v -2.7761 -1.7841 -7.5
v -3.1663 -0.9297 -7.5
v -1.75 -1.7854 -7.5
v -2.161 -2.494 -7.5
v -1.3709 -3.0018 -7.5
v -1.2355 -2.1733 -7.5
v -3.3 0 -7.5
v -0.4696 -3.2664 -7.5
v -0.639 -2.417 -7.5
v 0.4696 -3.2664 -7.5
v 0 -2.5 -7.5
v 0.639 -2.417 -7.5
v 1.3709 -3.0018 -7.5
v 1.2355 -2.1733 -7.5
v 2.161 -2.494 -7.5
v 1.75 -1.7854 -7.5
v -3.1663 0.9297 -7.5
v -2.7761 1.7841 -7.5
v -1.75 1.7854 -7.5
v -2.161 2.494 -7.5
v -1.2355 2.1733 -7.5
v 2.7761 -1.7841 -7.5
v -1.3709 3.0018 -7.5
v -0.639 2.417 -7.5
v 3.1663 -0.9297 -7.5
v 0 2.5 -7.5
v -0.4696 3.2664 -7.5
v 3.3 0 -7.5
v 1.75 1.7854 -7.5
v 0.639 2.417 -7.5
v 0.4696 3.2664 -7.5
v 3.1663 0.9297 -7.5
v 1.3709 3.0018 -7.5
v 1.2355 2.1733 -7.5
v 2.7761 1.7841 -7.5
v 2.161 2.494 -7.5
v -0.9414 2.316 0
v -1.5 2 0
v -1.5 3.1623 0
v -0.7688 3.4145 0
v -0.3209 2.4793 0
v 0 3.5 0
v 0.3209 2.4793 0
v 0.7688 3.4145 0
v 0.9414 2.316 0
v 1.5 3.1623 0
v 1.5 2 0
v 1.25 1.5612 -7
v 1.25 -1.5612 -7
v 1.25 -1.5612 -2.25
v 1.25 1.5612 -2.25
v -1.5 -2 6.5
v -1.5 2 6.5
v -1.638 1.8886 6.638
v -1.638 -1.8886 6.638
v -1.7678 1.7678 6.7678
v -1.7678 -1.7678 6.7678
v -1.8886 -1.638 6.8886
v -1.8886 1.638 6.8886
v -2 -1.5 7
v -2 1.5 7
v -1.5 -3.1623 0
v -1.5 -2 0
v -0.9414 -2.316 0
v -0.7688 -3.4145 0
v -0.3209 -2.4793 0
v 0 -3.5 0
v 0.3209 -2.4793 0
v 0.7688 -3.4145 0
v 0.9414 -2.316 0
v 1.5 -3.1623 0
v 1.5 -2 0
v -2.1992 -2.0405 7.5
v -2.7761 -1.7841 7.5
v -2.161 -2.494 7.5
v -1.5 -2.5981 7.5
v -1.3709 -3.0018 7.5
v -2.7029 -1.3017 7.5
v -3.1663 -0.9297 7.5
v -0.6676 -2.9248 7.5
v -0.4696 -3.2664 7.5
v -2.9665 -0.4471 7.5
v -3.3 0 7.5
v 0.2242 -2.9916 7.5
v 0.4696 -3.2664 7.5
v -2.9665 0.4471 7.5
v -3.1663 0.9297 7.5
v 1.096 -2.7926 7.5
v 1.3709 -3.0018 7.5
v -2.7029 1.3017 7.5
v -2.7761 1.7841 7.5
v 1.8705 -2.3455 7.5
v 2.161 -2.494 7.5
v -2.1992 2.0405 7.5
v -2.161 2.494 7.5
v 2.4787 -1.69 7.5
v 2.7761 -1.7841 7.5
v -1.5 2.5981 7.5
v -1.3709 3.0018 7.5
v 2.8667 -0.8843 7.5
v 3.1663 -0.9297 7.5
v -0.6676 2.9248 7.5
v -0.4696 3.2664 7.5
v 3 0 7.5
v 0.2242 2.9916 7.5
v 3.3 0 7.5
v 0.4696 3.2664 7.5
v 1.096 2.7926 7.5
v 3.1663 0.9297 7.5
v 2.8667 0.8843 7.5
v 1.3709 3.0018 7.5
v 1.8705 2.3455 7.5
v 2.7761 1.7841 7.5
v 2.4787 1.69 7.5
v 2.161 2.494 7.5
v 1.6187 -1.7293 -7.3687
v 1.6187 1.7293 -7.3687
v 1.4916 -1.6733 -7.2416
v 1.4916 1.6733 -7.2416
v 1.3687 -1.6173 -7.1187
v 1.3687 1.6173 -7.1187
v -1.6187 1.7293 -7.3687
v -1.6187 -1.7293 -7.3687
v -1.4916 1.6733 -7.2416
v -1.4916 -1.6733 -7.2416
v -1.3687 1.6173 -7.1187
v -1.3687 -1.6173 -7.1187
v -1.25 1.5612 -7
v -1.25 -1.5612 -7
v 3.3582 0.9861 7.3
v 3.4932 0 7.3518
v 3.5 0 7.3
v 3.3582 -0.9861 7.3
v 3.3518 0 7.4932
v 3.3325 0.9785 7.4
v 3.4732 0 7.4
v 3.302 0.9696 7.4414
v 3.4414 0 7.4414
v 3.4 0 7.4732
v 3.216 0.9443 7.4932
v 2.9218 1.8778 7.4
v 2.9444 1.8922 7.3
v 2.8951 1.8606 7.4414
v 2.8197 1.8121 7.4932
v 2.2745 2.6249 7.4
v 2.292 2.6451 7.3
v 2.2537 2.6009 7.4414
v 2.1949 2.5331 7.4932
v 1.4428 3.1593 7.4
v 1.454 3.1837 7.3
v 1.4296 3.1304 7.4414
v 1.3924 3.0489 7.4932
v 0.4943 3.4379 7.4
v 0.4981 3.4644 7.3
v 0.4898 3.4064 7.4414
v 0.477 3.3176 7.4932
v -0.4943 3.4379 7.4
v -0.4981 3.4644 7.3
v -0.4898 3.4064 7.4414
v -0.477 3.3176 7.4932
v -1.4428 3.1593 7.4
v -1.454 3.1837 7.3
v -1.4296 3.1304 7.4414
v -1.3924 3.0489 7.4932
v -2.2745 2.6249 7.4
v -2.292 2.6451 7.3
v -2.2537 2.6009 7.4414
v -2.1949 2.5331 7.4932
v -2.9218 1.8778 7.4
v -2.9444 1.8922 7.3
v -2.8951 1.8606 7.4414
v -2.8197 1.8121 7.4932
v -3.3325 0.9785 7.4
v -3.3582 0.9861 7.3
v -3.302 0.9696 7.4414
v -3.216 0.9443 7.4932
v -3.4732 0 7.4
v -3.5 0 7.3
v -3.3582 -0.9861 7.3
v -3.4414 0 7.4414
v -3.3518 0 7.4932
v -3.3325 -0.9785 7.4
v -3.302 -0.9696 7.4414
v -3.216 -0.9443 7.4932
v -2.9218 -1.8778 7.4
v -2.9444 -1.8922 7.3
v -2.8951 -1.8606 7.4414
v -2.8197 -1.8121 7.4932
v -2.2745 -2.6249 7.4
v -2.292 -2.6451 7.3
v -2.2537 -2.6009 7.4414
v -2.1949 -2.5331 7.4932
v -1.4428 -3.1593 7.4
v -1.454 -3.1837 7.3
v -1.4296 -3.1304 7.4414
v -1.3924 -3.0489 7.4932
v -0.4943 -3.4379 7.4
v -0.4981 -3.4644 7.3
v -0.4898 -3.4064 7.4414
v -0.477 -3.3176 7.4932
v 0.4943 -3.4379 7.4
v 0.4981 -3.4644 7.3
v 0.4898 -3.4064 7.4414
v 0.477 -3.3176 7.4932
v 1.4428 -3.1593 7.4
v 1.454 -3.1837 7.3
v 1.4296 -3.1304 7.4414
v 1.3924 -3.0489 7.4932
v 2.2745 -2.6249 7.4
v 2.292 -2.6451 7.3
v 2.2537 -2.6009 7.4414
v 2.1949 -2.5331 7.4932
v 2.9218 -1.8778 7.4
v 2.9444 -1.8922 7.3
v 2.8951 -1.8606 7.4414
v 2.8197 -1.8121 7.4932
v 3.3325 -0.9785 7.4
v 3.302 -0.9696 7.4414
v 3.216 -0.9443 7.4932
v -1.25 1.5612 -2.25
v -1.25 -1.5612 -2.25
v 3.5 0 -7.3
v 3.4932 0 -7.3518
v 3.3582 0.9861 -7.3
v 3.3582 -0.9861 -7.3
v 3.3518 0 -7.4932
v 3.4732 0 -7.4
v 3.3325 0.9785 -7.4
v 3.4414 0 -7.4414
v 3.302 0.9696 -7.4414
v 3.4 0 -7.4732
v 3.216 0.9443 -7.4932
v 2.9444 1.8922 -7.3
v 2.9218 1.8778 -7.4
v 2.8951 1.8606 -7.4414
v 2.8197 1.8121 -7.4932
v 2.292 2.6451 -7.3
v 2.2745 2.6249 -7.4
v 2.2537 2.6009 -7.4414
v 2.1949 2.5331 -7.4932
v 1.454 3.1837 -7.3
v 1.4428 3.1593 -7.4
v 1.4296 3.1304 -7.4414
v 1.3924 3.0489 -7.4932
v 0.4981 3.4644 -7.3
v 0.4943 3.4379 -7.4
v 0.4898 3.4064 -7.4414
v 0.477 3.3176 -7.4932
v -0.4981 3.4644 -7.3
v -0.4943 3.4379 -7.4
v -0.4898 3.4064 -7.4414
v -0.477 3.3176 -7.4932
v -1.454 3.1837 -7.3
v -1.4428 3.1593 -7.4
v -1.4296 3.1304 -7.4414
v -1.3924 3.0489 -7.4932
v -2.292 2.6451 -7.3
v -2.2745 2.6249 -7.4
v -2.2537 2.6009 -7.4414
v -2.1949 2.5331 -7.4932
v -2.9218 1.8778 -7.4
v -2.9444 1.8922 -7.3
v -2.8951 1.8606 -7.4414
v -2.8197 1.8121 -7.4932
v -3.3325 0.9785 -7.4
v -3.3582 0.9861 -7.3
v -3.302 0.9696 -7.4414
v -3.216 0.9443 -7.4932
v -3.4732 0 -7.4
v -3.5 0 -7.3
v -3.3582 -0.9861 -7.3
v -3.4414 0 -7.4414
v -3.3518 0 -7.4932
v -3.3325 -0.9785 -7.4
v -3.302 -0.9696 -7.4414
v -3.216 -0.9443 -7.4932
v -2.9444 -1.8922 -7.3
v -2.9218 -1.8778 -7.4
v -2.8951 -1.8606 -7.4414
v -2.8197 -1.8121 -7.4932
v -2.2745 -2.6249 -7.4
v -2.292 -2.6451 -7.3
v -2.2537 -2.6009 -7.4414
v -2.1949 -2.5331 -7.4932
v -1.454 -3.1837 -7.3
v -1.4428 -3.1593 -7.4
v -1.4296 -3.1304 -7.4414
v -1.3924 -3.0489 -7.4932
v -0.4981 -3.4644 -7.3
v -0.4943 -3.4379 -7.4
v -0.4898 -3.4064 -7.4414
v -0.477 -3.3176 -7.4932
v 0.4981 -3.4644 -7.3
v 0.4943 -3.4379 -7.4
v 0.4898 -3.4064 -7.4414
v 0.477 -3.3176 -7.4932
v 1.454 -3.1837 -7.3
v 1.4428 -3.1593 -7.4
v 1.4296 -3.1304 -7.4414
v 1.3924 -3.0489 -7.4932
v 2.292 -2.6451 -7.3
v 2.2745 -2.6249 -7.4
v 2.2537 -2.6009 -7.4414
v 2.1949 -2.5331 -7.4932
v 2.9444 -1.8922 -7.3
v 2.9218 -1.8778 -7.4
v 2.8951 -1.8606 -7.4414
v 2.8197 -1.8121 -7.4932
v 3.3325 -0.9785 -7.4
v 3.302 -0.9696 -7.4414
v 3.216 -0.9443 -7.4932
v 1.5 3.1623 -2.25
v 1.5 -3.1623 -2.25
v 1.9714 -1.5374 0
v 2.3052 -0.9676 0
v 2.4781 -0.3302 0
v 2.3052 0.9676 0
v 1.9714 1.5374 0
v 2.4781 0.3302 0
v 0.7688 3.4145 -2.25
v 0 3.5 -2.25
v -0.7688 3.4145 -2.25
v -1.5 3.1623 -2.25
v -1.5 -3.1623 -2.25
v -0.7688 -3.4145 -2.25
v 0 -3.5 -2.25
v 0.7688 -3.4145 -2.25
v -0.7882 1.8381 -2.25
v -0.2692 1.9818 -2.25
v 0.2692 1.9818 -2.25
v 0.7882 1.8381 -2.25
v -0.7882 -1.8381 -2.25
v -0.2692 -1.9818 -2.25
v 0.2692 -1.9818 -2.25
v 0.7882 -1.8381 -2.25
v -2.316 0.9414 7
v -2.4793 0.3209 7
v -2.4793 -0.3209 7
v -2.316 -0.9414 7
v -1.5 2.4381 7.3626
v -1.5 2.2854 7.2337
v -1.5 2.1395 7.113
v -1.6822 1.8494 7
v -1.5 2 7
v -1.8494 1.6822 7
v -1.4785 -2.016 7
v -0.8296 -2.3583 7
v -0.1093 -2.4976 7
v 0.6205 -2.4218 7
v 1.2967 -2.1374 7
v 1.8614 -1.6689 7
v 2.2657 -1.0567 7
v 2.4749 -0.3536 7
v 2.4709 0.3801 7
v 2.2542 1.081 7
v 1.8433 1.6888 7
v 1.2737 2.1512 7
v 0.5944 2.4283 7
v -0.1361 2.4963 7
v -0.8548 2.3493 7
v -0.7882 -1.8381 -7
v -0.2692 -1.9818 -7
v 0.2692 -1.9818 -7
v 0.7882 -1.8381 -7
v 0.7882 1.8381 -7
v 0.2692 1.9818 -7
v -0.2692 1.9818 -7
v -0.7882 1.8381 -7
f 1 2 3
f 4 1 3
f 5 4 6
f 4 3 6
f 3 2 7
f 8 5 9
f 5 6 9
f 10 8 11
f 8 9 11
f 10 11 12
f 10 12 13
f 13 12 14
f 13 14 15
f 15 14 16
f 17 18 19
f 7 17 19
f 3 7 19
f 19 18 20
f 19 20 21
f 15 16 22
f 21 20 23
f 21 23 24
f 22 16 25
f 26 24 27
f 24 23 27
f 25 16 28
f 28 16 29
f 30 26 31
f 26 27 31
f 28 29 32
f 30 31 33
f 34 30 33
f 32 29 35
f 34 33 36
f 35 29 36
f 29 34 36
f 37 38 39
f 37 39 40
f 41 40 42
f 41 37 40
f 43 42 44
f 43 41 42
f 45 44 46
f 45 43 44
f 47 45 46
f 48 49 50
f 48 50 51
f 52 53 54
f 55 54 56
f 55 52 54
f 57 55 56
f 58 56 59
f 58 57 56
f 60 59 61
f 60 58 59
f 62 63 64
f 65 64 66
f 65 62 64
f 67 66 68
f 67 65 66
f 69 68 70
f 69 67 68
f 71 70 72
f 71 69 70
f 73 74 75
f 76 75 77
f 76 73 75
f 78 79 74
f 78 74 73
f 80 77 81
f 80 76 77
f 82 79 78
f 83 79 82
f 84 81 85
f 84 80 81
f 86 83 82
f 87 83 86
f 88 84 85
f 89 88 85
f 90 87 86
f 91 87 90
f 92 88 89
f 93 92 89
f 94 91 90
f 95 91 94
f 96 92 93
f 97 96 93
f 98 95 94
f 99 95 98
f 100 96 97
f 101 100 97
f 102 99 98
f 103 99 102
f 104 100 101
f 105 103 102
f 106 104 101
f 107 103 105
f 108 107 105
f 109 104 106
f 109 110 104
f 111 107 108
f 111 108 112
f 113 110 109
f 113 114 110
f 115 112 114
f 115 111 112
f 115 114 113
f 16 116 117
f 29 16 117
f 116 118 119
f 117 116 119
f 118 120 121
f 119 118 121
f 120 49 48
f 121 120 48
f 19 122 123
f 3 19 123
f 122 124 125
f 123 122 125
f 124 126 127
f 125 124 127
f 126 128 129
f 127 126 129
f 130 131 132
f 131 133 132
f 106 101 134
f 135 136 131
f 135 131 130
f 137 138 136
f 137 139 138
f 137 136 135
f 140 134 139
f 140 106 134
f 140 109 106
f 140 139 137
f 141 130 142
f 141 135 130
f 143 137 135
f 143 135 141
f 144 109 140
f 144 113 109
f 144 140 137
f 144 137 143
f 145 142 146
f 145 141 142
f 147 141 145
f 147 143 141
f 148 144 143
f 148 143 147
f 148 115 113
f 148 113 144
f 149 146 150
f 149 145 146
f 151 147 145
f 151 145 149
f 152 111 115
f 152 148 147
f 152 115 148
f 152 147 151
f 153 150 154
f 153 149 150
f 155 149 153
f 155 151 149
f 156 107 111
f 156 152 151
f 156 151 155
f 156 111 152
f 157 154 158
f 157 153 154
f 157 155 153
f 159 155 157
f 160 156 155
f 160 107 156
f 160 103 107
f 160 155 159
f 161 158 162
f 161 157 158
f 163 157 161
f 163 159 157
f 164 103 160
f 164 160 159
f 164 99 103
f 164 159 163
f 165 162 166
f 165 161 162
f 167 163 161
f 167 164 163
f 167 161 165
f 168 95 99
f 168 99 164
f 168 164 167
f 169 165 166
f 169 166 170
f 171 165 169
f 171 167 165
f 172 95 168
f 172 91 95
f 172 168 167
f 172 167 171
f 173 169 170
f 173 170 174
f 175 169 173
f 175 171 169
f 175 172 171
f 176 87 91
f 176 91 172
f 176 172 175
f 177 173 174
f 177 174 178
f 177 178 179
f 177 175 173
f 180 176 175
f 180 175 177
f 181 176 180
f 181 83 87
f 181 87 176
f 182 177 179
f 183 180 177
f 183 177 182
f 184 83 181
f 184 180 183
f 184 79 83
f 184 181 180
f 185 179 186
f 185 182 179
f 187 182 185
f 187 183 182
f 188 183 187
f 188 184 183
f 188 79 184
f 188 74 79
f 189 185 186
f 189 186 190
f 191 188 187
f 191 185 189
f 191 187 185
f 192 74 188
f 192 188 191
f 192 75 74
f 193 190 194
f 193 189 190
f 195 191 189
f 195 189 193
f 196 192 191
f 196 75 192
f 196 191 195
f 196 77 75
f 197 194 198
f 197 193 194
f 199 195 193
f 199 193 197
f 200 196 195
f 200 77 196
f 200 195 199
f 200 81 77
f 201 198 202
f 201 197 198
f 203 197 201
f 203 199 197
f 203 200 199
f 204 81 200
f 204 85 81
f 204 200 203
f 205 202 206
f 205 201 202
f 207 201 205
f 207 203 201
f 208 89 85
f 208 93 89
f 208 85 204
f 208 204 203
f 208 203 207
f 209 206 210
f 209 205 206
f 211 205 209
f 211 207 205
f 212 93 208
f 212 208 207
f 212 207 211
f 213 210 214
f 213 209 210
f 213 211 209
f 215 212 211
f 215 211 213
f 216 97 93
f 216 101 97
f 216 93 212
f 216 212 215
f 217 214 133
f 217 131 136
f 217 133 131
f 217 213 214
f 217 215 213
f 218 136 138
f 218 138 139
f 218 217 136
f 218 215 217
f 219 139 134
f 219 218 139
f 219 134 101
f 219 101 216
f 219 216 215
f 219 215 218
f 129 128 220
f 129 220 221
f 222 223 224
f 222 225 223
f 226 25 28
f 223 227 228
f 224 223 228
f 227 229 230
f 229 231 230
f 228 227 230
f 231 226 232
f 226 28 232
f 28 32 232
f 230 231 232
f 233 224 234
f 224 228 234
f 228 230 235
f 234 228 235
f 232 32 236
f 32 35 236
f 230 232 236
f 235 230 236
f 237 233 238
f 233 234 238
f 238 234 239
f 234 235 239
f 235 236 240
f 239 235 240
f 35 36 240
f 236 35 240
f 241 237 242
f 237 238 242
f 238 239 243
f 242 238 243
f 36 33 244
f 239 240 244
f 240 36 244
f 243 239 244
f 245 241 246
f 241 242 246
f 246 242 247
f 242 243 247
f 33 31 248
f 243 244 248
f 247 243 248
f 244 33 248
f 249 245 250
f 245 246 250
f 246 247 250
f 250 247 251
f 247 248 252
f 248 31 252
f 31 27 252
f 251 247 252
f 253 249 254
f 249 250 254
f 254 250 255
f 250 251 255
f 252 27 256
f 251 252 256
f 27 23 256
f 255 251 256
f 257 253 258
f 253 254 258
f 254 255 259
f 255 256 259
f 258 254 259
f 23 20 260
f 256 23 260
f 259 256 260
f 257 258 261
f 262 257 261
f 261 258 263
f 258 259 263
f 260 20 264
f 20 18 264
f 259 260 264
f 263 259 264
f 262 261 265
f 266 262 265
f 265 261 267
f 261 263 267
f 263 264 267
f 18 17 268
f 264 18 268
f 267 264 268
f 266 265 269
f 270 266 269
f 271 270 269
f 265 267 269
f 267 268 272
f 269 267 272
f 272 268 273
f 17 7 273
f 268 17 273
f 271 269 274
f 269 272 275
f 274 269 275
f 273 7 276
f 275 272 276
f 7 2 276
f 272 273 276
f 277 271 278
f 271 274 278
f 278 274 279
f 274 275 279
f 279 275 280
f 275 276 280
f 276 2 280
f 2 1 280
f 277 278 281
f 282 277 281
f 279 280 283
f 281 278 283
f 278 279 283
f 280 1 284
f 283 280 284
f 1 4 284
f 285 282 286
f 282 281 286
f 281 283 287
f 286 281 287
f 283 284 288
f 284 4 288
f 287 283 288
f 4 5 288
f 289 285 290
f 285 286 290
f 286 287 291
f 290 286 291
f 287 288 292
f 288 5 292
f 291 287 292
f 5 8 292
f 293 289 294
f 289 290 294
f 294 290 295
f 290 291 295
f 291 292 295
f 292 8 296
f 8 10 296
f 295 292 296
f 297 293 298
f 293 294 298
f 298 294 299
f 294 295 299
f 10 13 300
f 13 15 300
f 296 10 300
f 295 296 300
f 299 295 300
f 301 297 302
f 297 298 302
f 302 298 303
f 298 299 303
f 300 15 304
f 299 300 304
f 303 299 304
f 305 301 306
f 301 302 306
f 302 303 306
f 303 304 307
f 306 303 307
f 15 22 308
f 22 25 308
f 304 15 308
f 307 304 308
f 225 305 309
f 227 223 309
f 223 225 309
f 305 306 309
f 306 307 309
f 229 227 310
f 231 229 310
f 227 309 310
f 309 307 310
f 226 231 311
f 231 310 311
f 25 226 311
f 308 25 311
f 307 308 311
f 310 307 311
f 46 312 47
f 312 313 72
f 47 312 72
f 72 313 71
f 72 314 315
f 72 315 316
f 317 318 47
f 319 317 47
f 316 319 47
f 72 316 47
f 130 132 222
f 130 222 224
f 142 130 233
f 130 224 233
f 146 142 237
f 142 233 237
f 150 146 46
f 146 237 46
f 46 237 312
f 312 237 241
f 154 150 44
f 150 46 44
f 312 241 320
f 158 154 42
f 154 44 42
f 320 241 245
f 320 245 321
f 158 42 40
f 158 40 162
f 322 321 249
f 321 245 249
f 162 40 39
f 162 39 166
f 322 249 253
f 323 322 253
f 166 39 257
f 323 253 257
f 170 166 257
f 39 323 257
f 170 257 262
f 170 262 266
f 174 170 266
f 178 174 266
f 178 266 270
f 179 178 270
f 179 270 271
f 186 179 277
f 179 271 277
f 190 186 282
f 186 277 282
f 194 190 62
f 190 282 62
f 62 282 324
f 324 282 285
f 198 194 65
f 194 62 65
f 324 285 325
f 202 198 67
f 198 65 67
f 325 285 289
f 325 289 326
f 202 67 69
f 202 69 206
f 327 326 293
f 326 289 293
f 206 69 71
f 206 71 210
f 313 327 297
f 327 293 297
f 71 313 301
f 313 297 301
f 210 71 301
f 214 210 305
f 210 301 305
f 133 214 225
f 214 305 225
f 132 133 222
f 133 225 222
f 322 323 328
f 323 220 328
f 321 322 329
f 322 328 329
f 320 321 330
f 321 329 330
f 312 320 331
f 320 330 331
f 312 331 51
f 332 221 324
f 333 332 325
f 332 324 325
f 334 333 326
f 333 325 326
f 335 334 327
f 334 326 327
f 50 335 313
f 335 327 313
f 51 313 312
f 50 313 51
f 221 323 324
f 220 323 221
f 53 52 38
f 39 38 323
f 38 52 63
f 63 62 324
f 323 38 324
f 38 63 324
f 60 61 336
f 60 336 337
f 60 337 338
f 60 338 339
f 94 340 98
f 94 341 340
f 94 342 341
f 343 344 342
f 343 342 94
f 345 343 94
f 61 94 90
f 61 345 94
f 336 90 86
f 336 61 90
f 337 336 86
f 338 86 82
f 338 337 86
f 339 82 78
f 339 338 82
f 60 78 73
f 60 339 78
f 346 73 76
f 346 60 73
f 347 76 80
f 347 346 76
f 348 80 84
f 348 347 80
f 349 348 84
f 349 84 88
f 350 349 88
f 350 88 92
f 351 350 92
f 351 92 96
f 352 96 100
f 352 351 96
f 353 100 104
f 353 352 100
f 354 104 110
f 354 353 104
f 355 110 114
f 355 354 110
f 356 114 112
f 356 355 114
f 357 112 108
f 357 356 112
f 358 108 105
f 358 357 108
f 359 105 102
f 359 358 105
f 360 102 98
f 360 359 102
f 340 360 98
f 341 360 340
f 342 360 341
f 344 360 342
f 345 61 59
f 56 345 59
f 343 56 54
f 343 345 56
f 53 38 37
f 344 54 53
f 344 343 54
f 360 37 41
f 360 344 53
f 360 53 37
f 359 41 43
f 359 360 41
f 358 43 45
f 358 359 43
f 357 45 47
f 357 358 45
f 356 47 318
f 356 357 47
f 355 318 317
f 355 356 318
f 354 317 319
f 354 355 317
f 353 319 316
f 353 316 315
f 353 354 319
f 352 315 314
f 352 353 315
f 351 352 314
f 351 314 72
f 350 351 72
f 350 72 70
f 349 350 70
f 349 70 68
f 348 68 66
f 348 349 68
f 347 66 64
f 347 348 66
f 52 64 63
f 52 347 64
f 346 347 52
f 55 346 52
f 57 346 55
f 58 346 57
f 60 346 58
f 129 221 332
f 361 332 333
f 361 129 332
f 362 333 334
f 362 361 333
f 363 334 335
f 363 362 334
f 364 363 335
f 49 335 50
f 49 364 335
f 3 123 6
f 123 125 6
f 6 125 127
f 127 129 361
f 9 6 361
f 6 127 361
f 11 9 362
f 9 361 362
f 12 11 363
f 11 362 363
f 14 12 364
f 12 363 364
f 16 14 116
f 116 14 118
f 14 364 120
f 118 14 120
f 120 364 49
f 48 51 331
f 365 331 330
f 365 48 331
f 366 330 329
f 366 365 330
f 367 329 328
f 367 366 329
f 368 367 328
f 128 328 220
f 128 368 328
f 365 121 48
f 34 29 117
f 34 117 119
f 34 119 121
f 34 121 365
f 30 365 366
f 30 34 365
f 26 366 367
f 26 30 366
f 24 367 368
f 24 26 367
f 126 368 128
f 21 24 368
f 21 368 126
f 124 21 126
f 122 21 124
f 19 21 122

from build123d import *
from build123d.topology import SkipClean

# Parameters (mm, degrees)
EXTRUDE_1_DEPTH                 = 7.5
EXTRUDE_1_DEPTH_BACK            = 7.5
SKETCH_1_R                      = 3.5
CUT_EXTRUDE_1_REACH             = 10.986
CUT_EXTRUDE_1_DIRECTION_2_REACH = 10.986
FILLET_1_R                      = 0.2
SKETCH_3_R                      = 2.5
CUT_EXTRUDE_2_DEPTH             = 0.5
CUT_EXTRUDE_3_DEPTH             = 7
CHAMFER_1_SIZE                  = 0.5
CHAMFER_2_SIZE                  = 0.5


with BuildPart() as part:
    # 草图1 → 凸台-拉伸1 (new, two sides: drawn at the far end of the back side and taken through both)
    with BuildSketch(Plane.XY.offset(-EXTRUDE_1_DEPTH_BACK)):
        Circle(SKETCH_1_R)
        with BuildLine():
            Line((-1.25, 1.5612495), (-1.25, -1.5612495))
            ThreePointArc((-1.25, -1.5612495), (0, -2), (1.25, -1.5612495))
            Line((1.25, -1.5612495), (1.25, 1.5612495))
            ThreePointArc((1.25, 1.5612495), (0, 2), (-1.25, 1.5612495))
        make_face(mode=Mode.SUBTRACT)
    extrude(amount=EXTRUDE_1_DEPTH + EXTRUDE_1_DEPTH_BACK)

    # 草图2 → 切除-拉伸1 (cut, up to next)
    with BuildSketch(Plane(origin=(0, 0, 0), x_dir=(1, 0, 0), z_dir=(0, 1, 0)), mode=Mode.PRIVATE) as cut_extrude_1_sk1:
        Polygon((0, 0), (-1.5, 0), (-1.5, 2.25), (1.5, 2.25), (1.5, 0), align=None)
    cut_extrude_1_tool1 = extrude(cut_extrude_1_sk1.sketch, amount=-CUT_EXTRUDE_1_REACH, mode=Mode.PRIVATE) & part.part
    add(cut_extrude_1_tool1.solids().sort_by_distance((0, 0, -1.125))[0], mode=Mode.SUBTRACT)

    # 草图2 → 切除-拉伸1 direction 2 (cut, up to next)
    with BuildSketch(Plane(origin=(0, 0, 0), x_dir=(1, 0, 0), z_dir=(0, 1, 0)), mode=Mode.PRIVATE) as cut_extrude_1_direction_2_sk1:
        Polygon((0, 0), (-1.5, 0), (-1.5, 2.25), (1.5, 2.25), (1.5, 0), align=None)
    cut_extrude_1_direction_2_tool1 = extrude(cut_extrude_1_direction_2_sk1.sketch, amount=CUT_EXTRUDE_1_DIRECTION_2_REACH, mode=Mode.PRIVATE) & part.part
    add(cut_extrude_1_direction_2_tool1.solids().sort_by_distance((0, 0, -1.125))[0], mode=Mode.SUBTRACT)

    # 圆角1
    fillet_1_edges = [part.edges().sort_by_distance(p)[0] for p in [
        (-3.5, 0, -7.5),
        (-3.5, 0, 7.5),
    ]]
    fillet(fillet_1_edges, radius=FILLET_1_R)

    # 草图3 → 切除-拉伸2 (cut)
    with BuildSketch(Plane.XY.offset(7.5)):
        Circle(SKETCH_3_R)
    extrude(amount=-CUT_EXTRUDE_2_DEPTH, mode=Mode.SUBTRACT)

    # 草图4 → 切除-拉伸3 (cut)
    with SkipClean():  # the faces are left unmerged after this step: merging them gives an invalid solid
        with BuildSketch(Plane.XY.offset(7)):
            with BuildLine():
                Line((-1.5, 0), (-1.5, 2))
                ThreePointArc((-1.5, 2), (2.5, 0), (-1.5, -2))
                Line((-1.5, -2), (-1.5, 0))
            make_face()
        extrude(amount=-CUT_EXTRUDE_3_DEPTH, mode=Mode.SUBTRACT)

    # 倒角1
    # the kernel refuses this chamfer: 0.5 mm, written as the material it takes off along each edge
    with BuildSketch(Plane(origin=(0, 0, 7.5), x_dir=(1, 0, 0), z_dir=(0, -1, 0))) as chamfer_1_piece_1_section:
        Polygon((2.5 + CHAMFER_1_SIZE, 0), (2.5, -CHAMFER_1_SIZE), (2.5, 0), align=None)
    chamfer_1_piece_1 = revolve(axis=Axis((0, 0, 7.5), (0, 0, 1)), mode=Mode.PRIVATE)
    chamfer_1_piece_1 = split(chamfer_1_piece_1, bisect_by=Plane(origin=(-1.5, 2.458621217, 7.265320049), z_dir=(1, 0, 0)), keep=Keep.TOP, mode=Mode.PRIVATE)
    chamfer_1_piece_1 = split(chamfer_1_piece_1, bisect_by=Plane(origin=(1.229310608, 2.458621217, 7), z_dir=(0, 0, 1)), keep=Keep.TOP, mode=Mode.PRIVATE)
    add(chamfer_1_piece_1, mode=Mode.SUBTRACT)
    with BuildSketch(Plane(origin=(0, 0, 7.5), x_dir=(1, 0, 0), z_dir=(0, -1, 0))) as chamfer_1_piece_2_section:
        Polygon((2.5 + CHAMFER_1_SIZE, 0), (2.5, -CHAMFER_1_SIZE), (2.5, 0), align=None)
    chamfer_1_piece_2 = revolve(axis=Axis((0, 0, 7.5), (0, 0, 1)), mode=Mode.PRIVATE)
    chamfer_1_piece_2 = split(chamfer_1_piece_2, bisect_by=Plane(origin=(-1.5, 0, 7.263385129), z_dir=(-1, 0, 0)), keep=Keep.TOP, mode=Mode.PRIVATE)
    chamfer_1_piece_2 = split(chamfer_1_piece_2, bisect_by=Plane(origin=(-2.750757007, 0, 7), z_dir=(0, 0, 1)), keep=Keep.TOP, mode=Mode.PRIVATE)
    add(chamfer_1_piece_2, mode=Mode.SUBTRACT)
    with BuildSketch(Plane(origin=(-1.5, -3.285841494, 7), x_dir=(0.02749587661058651, 0, -0.9996219169112968), z_dir=(0, 1, 0))) as chamfer_1_piece_3_section:
        Polygon((CHAMFER_1_SIZE * 0.999621916911, CHAMFER_1_SIZE * 0.0274958766106), (-CHAMFER_1_SIZE * 0.0274958766106, CHAMFER_1_SIZE * 0.999621916911), (0, 0), align=None)
    chamfer_1_piece_3 = extrude(amount=6.571682988, mode=Mode.PRIVATE)
    chamfer_1_piece_3 = chamfer_1_piece_3 & Plane(origin=(0, 0, 6.830829646), x_dir=(-0.5999999999999999, 0.8, 0), z_dir=(0, 0, 1)) * Cylinder(2.5, 16, mode=Mode.PRIVATE)
    add(chamfer_1_piece_3, mode=Mode.SUBTRACT)

    # 倒角2
    chamfer_2_edges = [part.edges().sort_by_distance(p)[0] for p in [
        (-1.25, 0, -7.5),
        (0, -2, -7.5),
        (1.25, 0, -7.5),
        (0, 2, -7.5),
    ]]
    chamfer(chamfer_2_edges, length=CHAMFER_2_SIZE)


solid = part.part
